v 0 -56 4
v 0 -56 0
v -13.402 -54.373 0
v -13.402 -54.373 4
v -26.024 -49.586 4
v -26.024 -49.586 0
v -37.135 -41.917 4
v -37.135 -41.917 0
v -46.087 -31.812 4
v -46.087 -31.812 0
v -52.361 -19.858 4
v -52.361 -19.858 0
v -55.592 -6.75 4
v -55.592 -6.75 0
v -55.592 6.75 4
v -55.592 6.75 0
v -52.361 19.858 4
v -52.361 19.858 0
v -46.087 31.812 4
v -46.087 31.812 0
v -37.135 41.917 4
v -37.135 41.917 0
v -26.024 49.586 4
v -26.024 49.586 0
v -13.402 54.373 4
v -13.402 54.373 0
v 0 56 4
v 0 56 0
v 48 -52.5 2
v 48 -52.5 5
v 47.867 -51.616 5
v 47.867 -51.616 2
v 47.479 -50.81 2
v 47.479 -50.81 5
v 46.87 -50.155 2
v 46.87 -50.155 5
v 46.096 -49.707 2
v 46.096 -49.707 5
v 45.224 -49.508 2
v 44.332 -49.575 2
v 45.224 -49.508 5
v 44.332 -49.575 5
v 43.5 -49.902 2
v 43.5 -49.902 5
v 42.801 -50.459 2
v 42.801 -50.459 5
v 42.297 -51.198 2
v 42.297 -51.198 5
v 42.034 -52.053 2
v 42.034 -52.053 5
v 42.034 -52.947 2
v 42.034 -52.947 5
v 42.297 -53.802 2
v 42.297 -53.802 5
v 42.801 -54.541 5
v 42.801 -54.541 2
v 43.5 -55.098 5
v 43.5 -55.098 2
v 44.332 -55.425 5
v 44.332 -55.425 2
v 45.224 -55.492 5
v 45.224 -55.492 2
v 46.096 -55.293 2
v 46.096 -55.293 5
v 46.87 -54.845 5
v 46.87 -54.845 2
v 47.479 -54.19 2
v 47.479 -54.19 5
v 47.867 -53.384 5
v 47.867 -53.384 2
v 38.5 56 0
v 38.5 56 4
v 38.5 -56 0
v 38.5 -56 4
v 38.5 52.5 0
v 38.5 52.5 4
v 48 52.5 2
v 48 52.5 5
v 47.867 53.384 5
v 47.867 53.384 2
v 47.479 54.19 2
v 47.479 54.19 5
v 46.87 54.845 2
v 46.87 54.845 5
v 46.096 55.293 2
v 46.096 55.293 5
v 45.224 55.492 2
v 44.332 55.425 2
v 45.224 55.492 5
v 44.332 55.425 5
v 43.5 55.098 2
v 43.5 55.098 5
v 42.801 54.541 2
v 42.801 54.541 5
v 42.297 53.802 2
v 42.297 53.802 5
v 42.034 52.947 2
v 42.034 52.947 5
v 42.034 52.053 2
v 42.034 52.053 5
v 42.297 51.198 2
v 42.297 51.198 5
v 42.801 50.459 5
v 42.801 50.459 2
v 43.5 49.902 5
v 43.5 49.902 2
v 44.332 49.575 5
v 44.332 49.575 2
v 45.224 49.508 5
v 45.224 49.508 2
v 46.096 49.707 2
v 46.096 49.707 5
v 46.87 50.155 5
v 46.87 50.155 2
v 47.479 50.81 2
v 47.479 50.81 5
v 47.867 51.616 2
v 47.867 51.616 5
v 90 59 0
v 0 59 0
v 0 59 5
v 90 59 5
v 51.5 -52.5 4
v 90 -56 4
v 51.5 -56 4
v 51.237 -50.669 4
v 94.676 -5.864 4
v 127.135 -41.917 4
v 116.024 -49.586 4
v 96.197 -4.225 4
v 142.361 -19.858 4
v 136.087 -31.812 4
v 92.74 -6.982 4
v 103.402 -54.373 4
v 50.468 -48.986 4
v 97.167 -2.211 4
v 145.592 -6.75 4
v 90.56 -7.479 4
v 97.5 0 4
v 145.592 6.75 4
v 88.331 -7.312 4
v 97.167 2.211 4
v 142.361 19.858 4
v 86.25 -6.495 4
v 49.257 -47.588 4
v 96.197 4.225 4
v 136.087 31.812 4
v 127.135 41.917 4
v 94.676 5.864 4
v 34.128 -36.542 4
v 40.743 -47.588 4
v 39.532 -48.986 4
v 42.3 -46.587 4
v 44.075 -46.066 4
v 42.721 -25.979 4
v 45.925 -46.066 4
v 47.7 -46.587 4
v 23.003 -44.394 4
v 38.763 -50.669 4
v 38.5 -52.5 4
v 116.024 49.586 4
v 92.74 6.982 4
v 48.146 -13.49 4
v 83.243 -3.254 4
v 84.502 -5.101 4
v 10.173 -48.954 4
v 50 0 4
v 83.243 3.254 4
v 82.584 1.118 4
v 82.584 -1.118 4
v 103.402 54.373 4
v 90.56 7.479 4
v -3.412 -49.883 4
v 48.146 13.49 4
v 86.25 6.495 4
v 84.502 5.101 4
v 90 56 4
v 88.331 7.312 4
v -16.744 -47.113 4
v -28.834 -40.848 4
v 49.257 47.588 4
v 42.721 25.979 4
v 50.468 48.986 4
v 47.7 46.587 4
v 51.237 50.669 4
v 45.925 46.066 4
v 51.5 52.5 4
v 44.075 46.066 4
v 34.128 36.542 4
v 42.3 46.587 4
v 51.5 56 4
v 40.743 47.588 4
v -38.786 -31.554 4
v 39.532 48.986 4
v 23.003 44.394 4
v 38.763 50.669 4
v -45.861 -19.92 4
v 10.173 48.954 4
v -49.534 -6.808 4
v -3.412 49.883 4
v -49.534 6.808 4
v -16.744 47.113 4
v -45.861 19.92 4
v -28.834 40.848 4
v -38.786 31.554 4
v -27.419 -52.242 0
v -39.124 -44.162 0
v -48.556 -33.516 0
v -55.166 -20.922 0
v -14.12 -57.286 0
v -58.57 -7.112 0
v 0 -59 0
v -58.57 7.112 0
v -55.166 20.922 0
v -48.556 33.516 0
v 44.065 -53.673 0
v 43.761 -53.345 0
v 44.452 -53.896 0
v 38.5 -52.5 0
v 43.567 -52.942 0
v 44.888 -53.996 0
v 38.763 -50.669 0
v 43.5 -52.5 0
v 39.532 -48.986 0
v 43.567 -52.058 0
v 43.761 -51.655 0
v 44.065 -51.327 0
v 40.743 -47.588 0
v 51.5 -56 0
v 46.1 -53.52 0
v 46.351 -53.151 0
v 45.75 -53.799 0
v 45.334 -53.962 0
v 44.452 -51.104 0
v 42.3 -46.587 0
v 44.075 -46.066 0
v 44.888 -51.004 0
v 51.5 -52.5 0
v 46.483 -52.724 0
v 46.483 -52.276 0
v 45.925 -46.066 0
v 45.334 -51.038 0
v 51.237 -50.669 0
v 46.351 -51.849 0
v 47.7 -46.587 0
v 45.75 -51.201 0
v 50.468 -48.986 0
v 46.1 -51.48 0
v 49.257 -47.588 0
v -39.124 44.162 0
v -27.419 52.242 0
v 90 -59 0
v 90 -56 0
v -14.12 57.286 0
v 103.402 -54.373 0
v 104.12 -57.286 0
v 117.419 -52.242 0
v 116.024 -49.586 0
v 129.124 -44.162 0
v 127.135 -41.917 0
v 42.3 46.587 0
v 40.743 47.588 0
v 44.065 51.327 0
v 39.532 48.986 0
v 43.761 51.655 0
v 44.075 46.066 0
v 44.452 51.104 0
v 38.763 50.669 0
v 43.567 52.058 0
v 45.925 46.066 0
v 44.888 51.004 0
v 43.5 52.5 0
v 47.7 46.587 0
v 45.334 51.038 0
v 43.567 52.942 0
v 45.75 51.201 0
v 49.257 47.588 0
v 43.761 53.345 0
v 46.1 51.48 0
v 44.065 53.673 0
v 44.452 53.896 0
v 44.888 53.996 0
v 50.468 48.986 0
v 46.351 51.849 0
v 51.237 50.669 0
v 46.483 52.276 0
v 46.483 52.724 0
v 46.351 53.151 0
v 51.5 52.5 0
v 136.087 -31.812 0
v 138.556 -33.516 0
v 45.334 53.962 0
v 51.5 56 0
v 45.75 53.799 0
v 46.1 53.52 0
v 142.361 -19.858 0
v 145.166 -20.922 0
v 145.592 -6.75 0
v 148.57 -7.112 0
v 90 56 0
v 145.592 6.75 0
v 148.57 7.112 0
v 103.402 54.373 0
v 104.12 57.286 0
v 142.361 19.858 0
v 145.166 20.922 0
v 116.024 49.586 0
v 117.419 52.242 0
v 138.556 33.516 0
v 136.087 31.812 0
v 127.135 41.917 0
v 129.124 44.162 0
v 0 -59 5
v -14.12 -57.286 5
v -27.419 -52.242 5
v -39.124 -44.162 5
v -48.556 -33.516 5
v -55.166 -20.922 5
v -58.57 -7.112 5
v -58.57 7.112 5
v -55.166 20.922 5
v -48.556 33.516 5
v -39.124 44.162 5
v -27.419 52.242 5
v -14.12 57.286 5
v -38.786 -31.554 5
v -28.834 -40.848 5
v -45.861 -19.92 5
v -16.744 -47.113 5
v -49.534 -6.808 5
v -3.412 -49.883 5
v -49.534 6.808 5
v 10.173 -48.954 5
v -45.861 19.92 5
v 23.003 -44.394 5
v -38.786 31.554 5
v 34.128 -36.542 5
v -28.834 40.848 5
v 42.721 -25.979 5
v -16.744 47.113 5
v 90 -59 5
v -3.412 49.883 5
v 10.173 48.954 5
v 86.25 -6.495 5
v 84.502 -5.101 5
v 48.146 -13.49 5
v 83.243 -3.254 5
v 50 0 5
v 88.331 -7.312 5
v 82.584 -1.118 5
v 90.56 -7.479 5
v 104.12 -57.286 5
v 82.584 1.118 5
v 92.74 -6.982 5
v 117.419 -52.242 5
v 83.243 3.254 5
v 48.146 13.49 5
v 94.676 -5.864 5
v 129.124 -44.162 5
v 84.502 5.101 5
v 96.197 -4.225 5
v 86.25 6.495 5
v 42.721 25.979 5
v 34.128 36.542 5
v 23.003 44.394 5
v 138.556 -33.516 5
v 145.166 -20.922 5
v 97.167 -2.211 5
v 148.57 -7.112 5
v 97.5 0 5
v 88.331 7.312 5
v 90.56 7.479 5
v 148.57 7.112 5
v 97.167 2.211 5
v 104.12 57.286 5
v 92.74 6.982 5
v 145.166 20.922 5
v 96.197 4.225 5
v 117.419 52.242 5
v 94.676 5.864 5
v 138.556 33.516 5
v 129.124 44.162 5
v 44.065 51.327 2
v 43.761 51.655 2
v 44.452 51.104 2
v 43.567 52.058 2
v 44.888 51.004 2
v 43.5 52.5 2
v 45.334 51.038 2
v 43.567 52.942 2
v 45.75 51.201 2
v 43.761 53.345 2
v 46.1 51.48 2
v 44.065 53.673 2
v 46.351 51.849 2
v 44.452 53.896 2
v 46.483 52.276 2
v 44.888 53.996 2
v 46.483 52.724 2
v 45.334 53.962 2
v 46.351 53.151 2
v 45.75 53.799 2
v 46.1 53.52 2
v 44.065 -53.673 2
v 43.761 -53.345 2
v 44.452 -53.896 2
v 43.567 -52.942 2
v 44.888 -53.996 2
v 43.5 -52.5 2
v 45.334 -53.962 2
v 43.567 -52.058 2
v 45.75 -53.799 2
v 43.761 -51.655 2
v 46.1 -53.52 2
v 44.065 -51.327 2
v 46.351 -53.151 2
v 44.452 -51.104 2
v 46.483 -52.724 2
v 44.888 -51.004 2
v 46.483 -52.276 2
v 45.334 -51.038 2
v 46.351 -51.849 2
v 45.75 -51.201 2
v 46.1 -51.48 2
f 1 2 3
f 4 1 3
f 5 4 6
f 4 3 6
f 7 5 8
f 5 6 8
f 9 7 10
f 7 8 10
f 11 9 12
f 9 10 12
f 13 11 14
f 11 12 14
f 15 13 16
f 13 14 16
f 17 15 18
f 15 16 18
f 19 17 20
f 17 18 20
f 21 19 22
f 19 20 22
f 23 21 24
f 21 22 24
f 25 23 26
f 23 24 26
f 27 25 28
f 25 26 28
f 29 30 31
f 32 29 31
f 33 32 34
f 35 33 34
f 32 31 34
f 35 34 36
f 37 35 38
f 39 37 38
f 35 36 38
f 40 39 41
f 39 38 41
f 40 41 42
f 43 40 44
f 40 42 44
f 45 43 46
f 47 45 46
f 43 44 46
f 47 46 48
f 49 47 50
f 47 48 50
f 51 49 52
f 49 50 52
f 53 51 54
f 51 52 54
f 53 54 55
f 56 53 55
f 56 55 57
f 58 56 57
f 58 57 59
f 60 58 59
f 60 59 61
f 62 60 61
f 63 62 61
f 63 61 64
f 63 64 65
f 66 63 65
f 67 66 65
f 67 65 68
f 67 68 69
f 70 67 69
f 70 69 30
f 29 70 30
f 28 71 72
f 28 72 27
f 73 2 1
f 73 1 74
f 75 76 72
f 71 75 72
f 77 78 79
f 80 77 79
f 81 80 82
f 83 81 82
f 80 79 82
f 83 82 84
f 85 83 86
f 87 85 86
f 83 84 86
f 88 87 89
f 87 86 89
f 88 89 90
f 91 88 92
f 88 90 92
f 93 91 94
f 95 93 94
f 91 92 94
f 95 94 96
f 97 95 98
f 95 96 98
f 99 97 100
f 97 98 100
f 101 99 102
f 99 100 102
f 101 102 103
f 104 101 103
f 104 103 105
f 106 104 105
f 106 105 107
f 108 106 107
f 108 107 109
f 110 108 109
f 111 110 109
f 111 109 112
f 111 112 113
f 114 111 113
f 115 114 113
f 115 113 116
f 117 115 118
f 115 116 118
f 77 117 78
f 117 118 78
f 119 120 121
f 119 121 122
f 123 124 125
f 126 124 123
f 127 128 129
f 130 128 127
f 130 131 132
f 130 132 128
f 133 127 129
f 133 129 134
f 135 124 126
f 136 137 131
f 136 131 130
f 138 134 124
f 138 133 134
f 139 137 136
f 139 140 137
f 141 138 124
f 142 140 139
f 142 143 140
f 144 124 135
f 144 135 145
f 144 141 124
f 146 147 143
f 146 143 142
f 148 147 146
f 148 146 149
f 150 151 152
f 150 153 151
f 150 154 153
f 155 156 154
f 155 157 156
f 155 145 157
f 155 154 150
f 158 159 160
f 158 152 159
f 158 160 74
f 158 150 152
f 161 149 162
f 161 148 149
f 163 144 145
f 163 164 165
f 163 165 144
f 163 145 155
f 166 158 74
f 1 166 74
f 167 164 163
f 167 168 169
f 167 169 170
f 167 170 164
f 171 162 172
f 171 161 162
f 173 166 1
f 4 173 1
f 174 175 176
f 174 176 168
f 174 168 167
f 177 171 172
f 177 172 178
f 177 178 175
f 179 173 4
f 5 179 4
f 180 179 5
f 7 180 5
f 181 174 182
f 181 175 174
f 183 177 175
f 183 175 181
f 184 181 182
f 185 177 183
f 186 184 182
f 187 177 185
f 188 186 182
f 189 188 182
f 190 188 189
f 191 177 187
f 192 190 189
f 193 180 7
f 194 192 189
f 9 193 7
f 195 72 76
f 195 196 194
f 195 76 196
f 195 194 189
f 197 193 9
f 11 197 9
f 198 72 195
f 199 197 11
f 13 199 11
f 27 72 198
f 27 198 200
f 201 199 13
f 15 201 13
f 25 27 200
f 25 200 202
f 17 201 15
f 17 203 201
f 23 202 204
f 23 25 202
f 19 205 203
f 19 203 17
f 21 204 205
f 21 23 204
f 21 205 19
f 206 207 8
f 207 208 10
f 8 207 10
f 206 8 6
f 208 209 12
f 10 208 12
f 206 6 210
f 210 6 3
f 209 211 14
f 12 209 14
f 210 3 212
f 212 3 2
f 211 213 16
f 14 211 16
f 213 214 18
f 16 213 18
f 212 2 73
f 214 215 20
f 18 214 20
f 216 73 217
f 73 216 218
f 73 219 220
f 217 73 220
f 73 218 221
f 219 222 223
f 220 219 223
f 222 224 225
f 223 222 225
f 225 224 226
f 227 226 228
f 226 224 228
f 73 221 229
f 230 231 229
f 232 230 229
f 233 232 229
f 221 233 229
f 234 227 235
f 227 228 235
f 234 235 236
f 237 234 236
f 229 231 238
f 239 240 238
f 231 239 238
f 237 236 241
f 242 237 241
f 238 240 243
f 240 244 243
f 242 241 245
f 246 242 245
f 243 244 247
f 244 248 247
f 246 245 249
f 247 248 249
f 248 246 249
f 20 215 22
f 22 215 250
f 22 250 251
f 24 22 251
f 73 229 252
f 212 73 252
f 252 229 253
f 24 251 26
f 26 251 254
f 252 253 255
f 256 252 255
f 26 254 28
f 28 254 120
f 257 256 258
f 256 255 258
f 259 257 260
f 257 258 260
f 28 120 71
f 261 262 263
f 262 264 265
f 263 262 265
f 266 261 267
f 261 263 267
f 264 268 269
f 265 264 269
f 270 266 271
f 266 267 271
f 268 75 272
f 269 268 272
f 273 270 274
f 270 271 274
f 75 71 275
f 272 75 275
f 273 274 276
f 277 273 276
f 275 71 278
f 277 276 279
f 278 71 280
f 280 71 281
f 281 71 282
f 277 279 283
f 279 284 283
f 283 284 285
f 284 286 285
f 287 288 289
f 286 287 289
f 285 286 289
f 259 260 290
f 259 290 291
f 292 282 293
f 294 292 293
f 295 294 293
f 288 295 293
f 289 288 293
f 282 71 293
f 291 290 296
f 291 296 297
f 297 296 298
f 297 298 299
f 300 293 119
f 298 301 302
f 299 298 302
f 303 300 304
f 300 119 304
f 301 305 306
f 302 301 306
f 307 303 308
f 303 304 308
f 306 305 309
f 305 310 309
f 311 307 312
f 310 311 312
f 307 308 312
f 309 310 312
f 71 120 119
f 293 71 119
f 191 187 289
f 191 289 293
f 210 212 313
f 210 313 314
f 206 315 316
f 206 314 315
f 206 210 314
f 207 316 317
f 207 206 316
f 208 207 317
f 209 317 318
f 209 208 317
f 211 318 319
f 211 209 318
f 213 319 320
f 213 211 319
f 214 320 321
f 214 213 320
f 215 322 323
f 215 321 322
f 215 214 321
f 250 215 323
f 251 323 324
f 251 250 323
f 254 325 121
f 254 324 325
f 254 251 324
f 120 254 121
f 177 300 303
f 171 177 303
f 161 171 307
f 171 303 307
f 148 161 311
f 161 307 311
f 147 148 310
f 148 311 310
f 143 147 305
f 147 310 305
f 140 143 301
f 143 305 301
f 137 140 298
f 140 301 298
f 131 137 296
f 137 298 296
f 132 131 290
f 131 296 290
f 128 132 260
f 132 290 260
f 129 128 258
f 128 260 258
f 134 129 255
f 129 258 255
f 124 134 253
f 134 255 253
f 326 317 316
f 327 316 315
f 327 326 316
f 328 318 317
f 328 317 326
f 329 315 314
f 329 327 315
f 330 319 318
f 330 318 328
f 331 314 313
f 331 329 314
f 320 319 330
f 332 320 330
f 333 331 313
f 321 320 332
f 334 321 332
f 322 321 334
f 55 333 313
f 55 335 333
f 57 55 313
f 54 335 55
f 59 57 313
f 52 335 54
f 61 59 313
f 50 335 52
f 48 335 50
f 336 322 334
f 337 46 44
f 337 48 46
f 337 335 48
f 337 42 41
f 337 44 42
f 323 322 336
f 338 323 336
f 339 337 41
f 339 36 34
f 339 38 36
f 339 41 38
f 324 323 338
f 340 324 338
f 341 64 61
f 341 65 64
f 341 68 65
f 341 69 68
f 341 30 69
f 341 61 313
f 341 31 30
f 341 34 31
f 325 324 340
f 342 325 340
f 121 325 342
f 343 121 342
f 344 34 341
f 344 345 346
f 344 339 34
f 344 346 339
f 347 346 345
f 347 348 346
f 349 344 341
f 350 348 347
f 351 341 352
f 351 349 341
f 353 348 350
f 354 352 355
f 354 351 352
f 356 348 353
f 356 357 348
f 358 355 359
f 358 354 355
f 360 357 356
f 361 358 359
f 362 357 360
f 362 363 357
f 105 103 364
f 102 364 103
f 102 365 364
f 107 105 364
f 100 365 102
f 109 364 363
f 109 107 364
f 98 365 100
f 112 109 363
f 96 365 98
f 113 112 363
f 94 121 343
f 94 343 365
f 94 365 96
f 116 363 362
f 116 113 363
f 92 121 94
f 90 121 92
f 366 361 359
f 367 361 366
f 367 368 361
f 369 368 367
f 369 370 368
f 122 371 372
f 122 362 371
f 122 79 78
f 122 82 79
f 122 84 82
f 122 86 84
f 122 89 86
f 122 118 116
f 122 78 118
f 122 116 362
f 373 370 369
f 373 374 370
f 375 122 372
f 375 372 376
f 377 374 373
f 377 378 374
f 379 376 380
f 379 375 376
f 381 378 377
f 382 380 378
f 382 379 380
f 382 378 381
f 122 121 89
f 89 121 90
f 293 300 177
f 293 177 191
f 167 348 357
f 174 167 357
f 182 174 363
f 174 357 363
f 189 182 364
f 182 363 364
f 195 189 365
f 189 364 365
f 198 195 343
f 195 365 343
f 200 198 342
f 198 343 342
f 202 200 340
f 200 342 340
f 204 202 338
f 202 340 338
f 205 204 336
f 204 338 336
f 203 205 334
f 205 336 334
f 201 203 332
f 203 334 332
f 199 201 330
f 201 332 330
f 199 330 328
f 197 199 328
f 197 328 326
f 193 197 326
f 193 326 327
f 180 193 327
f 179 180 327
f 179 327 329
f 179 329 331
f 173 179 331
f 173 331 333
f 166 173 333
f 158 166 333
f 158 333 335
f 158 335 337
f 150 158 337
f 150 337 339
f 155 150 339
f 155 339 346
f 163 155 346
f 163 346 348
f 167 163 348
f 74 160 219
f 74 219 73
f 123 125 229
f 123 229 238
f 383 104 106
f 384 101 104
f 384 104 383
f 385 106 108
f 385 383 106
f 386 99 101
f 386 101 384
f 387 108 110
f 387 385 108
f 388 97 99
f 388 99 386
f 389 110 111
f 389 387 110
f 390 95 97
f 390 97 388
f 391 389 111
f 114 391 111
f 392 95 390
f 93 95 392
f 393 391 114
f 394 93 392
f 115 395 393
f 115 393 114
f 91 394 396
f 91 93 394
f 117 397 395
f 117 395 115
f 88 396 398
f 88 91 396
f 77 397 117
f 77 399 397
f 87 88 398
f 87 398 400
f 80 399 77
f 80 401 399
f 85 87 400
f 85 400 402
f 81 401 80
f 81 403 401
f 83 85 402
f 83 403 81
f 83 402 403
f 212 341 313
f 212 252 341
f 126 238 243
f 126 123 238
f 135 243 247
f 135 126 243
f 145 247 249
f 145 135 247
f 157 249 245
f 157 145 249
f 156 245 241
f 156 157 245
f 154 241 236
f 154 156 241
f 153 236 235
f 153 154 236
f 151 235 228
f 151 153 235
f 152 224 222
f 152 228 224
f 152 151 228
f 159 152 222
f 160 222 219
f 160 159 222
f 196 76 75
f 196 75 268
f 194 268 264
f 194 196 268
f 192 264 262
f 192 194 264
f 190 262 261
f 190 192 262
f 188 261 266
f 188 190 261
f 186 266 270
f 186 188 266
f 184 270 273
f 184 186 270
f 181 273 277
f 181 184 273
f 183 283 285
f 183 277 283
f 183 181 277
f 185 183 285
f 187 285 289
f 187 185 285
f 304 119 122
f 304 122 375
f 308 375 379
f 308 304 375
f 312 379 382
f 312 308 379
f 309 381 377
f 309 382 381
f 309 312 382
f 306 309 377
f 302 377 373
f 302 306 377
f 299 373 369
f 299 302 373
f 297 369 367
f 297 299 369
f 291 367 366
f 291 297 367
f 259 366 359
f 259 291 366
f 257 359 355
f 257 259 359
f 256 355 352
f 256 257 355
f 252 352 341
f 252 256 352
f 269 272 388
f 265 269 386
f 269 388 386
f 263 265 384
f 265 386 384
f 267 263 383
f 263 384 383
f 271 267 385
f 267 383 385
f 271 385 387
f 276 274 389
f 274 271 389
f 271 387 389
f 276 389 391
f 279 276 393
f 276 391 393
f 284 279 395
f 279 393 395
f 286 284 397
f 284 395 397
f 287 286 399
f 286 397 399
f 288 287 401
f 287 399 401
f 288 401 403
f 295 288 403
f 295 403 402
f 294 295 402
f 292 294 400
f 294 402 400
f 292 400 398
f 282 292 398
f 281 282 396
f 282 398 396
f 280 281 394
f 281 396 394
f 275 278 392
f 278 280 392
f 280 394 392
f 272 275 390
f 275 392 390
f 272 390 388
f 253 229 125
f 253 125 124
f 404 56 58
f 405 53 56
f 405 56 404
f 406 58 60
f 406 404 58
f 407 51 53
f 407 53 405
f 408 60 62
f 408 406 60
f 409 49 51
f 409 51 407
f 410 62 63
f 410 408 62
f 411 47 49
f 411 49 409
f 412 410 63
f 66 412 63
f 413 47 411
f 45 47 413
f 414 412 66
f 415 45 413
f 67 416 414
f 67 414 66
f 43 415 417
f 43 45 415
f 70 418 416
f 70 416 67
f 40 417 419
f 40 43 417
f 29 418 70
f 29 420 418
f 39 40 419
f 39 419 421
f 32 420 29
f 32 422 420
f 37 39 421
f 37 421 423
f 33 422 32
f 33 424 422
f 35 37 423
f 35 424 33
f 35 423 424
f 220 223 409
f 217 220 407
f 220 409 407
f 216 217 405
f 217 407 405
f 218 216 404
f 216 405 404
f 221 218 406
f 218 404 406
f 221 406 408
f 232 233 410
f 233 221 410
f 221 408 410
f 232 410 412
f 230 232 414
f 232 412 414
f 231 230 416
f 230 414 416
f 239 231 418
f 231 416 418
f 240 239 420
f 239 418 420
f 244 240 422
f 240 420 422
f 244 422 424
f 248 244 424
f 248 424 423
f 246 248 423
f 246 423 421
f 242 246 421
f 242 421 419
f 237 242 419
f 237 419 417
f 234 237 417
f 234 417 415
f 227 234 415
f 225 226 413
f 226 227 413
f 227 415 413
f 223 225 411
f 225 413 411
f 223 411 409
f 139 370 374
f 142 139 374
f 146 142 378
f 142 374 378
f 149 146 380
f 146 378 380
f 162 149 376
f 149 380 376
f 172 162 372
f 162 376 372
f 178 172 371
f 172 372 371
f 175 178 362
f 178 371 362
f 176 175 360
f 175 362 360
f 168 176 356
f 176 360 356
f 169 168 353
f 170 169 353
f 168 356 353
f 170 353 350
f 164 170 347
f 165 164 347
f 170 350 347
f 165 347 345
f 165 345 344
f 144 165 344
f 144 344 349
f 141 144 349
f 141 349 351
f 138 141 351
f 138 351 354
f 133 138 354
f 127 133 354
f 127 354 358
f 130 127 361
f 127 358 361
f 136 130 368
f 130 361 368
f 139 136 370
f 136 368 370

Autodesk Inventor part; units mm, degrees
ref_plane "YZ Plane" through (0, 0, 0) normal (1, 0, 0) x (0, 1, 0)
ref_plane "XZ Plane" through (0, 0, 0) normal (0, 1, 0) x (-1, 0, 0)
ref_plane "XY Plane" through (0, 0, 0) normal (0, 0, 1) x (1, 0, 0)
sketch "Sketch1" plane through (0, 0, 0) normal (0, 0, 1) x (1, 0, 0)
  circle A0 centre (0, 0) radius 59
  circle A1 centre (90, 0) radius 59
  line L0 (0, 59) -> (90, 59)
  line L1 (90, -59) -> (0, -59)
  dimension "d0" = 118
  dimension "d1" = 118
  dimension "d2" = 90
extrude "Extrusion1" add sketch "Sketch1" along normal blind 5
sketch "Sketch2" plane through (0, 0, 0) normal (0, 0, -1) x (-1, 0, 0)
  arc A0 (0, -59) -> (0, 59) centre (0, 0) ccw projected
  line L0 (-90, 59) -> (0, 59) projected
  arc A1 (-90, 59) -> (-90, -59) centre (-90, 0) ccw projected
  line L1 (0, -59) -> (-90, -59) projected
  arc A2 (0, -56) -> (0, 56) centre (0, 0) ccw
  line L2 (0, -56) -> (-90, -56)
  arc A3 (-90, 56) -> (-90, -56) centre (-90, 0) ccw
  line L3 (-90, 56) -> (0, 56)
  dimension "d5" = 3
extrude "Extrusion2" cut sketch "Sketch2" against normal blind 4 contours L2 A3 L3 A2
sketch "Sketch3" plane through (0, 0, 5) normal (0, 0, 1) x (1, 0, 0)
  circle A0 centre (90, 0) radius 7.5
  arc A1 (90, -59) -> (90, 59) centre (90, 0) ccw projected
  circle A2 centre (0, 0) radius 50
  dimension "d8" = 15
  dimension "d9" = 100
extrude "Extrusion3" cut sketch "Sketch3" against normal through all
sketch "Sketch4" plane through (0, 0, 5) normal (0, 0, 1) x (1, 0, 0)
  line L0 (45, 52.5) -> (45, -52.5) construction
  line L1 (90, 59) -> (0, 59) construction
  circle A0 centre (45, 52.5) radius 1.5
  circle A1 centre (45, -52.5) radius 1.5
  point P0 (0, 0)
  point P1 (45, 0)
  point P2 (45, 59)
  dimension "d12" = 105
  dimension "d13" = 3
  dimension "d14" = 3
extrude "Extrusion4" cut sketch "Sketch4" against normal through all
sketch "Sketch5" plane through (0, 0, 4) normal (0, 0, -1) x (-1, 0, 0)
  circle A0 centre (-45, -52.5) radius 1.5 projected
  circle A1 centre (-45, 52.5) radius 1.5 projected
  circle A2 centre (-45, 52.5) radius 6.5
  line L0 (-38.5, 52.5) -> (-38.5, 59)
  line L1 (-51.5, 52.5) -> (-51.5, 59)
  line L2 (-90, 59) -> (0, 59) projected
  line L3 (-38.5, 59) -> (-51.5, 59)
  line L4 (-51.5, 59) -> (-38.5, 59)
  circle A3 centre (-45, -52.5) radius 6.5
  line L5 (-38.5, -52.5) -> (-38.5, -59)
  line L6 (0, -59) -> (-90, -59) projected
  line L7 (-38.5, -59) -> (-51.5, -59)
  line L8 (-51.5, -59) -> (-51.5, -52.5)
  point P0 (0, 0)
  dimension "d17" = 13
  dimension "d18" = 13
extrude "Extrusion5" add sketch "Sketch5" along normal blind 4
sketch "Sketch6" plane through (0, 0, 5) normal (0, 0, 1) x (1, 0, 0)
  circle A0 centre (45, -52.5) radius 1.5 projected
  circle A1 centre (45, 52.5) radius 1.5 projected
  circle A2 centre (45, 52.5) radius 1.5 projected
  circle A3 centre (45, 52.5) radius 3
  circle A4 centre (45, -52.5) radius 3
  point P0 (0, 0)
  dimension "d21" = 6
  dimension "d22" = 6
extrude "Extrusion6" cut sketch "Sketch6" against normal blind 3 contours A0 | A1 | A3 | A4
properties part number "HA013" material "ABS Plastic"
